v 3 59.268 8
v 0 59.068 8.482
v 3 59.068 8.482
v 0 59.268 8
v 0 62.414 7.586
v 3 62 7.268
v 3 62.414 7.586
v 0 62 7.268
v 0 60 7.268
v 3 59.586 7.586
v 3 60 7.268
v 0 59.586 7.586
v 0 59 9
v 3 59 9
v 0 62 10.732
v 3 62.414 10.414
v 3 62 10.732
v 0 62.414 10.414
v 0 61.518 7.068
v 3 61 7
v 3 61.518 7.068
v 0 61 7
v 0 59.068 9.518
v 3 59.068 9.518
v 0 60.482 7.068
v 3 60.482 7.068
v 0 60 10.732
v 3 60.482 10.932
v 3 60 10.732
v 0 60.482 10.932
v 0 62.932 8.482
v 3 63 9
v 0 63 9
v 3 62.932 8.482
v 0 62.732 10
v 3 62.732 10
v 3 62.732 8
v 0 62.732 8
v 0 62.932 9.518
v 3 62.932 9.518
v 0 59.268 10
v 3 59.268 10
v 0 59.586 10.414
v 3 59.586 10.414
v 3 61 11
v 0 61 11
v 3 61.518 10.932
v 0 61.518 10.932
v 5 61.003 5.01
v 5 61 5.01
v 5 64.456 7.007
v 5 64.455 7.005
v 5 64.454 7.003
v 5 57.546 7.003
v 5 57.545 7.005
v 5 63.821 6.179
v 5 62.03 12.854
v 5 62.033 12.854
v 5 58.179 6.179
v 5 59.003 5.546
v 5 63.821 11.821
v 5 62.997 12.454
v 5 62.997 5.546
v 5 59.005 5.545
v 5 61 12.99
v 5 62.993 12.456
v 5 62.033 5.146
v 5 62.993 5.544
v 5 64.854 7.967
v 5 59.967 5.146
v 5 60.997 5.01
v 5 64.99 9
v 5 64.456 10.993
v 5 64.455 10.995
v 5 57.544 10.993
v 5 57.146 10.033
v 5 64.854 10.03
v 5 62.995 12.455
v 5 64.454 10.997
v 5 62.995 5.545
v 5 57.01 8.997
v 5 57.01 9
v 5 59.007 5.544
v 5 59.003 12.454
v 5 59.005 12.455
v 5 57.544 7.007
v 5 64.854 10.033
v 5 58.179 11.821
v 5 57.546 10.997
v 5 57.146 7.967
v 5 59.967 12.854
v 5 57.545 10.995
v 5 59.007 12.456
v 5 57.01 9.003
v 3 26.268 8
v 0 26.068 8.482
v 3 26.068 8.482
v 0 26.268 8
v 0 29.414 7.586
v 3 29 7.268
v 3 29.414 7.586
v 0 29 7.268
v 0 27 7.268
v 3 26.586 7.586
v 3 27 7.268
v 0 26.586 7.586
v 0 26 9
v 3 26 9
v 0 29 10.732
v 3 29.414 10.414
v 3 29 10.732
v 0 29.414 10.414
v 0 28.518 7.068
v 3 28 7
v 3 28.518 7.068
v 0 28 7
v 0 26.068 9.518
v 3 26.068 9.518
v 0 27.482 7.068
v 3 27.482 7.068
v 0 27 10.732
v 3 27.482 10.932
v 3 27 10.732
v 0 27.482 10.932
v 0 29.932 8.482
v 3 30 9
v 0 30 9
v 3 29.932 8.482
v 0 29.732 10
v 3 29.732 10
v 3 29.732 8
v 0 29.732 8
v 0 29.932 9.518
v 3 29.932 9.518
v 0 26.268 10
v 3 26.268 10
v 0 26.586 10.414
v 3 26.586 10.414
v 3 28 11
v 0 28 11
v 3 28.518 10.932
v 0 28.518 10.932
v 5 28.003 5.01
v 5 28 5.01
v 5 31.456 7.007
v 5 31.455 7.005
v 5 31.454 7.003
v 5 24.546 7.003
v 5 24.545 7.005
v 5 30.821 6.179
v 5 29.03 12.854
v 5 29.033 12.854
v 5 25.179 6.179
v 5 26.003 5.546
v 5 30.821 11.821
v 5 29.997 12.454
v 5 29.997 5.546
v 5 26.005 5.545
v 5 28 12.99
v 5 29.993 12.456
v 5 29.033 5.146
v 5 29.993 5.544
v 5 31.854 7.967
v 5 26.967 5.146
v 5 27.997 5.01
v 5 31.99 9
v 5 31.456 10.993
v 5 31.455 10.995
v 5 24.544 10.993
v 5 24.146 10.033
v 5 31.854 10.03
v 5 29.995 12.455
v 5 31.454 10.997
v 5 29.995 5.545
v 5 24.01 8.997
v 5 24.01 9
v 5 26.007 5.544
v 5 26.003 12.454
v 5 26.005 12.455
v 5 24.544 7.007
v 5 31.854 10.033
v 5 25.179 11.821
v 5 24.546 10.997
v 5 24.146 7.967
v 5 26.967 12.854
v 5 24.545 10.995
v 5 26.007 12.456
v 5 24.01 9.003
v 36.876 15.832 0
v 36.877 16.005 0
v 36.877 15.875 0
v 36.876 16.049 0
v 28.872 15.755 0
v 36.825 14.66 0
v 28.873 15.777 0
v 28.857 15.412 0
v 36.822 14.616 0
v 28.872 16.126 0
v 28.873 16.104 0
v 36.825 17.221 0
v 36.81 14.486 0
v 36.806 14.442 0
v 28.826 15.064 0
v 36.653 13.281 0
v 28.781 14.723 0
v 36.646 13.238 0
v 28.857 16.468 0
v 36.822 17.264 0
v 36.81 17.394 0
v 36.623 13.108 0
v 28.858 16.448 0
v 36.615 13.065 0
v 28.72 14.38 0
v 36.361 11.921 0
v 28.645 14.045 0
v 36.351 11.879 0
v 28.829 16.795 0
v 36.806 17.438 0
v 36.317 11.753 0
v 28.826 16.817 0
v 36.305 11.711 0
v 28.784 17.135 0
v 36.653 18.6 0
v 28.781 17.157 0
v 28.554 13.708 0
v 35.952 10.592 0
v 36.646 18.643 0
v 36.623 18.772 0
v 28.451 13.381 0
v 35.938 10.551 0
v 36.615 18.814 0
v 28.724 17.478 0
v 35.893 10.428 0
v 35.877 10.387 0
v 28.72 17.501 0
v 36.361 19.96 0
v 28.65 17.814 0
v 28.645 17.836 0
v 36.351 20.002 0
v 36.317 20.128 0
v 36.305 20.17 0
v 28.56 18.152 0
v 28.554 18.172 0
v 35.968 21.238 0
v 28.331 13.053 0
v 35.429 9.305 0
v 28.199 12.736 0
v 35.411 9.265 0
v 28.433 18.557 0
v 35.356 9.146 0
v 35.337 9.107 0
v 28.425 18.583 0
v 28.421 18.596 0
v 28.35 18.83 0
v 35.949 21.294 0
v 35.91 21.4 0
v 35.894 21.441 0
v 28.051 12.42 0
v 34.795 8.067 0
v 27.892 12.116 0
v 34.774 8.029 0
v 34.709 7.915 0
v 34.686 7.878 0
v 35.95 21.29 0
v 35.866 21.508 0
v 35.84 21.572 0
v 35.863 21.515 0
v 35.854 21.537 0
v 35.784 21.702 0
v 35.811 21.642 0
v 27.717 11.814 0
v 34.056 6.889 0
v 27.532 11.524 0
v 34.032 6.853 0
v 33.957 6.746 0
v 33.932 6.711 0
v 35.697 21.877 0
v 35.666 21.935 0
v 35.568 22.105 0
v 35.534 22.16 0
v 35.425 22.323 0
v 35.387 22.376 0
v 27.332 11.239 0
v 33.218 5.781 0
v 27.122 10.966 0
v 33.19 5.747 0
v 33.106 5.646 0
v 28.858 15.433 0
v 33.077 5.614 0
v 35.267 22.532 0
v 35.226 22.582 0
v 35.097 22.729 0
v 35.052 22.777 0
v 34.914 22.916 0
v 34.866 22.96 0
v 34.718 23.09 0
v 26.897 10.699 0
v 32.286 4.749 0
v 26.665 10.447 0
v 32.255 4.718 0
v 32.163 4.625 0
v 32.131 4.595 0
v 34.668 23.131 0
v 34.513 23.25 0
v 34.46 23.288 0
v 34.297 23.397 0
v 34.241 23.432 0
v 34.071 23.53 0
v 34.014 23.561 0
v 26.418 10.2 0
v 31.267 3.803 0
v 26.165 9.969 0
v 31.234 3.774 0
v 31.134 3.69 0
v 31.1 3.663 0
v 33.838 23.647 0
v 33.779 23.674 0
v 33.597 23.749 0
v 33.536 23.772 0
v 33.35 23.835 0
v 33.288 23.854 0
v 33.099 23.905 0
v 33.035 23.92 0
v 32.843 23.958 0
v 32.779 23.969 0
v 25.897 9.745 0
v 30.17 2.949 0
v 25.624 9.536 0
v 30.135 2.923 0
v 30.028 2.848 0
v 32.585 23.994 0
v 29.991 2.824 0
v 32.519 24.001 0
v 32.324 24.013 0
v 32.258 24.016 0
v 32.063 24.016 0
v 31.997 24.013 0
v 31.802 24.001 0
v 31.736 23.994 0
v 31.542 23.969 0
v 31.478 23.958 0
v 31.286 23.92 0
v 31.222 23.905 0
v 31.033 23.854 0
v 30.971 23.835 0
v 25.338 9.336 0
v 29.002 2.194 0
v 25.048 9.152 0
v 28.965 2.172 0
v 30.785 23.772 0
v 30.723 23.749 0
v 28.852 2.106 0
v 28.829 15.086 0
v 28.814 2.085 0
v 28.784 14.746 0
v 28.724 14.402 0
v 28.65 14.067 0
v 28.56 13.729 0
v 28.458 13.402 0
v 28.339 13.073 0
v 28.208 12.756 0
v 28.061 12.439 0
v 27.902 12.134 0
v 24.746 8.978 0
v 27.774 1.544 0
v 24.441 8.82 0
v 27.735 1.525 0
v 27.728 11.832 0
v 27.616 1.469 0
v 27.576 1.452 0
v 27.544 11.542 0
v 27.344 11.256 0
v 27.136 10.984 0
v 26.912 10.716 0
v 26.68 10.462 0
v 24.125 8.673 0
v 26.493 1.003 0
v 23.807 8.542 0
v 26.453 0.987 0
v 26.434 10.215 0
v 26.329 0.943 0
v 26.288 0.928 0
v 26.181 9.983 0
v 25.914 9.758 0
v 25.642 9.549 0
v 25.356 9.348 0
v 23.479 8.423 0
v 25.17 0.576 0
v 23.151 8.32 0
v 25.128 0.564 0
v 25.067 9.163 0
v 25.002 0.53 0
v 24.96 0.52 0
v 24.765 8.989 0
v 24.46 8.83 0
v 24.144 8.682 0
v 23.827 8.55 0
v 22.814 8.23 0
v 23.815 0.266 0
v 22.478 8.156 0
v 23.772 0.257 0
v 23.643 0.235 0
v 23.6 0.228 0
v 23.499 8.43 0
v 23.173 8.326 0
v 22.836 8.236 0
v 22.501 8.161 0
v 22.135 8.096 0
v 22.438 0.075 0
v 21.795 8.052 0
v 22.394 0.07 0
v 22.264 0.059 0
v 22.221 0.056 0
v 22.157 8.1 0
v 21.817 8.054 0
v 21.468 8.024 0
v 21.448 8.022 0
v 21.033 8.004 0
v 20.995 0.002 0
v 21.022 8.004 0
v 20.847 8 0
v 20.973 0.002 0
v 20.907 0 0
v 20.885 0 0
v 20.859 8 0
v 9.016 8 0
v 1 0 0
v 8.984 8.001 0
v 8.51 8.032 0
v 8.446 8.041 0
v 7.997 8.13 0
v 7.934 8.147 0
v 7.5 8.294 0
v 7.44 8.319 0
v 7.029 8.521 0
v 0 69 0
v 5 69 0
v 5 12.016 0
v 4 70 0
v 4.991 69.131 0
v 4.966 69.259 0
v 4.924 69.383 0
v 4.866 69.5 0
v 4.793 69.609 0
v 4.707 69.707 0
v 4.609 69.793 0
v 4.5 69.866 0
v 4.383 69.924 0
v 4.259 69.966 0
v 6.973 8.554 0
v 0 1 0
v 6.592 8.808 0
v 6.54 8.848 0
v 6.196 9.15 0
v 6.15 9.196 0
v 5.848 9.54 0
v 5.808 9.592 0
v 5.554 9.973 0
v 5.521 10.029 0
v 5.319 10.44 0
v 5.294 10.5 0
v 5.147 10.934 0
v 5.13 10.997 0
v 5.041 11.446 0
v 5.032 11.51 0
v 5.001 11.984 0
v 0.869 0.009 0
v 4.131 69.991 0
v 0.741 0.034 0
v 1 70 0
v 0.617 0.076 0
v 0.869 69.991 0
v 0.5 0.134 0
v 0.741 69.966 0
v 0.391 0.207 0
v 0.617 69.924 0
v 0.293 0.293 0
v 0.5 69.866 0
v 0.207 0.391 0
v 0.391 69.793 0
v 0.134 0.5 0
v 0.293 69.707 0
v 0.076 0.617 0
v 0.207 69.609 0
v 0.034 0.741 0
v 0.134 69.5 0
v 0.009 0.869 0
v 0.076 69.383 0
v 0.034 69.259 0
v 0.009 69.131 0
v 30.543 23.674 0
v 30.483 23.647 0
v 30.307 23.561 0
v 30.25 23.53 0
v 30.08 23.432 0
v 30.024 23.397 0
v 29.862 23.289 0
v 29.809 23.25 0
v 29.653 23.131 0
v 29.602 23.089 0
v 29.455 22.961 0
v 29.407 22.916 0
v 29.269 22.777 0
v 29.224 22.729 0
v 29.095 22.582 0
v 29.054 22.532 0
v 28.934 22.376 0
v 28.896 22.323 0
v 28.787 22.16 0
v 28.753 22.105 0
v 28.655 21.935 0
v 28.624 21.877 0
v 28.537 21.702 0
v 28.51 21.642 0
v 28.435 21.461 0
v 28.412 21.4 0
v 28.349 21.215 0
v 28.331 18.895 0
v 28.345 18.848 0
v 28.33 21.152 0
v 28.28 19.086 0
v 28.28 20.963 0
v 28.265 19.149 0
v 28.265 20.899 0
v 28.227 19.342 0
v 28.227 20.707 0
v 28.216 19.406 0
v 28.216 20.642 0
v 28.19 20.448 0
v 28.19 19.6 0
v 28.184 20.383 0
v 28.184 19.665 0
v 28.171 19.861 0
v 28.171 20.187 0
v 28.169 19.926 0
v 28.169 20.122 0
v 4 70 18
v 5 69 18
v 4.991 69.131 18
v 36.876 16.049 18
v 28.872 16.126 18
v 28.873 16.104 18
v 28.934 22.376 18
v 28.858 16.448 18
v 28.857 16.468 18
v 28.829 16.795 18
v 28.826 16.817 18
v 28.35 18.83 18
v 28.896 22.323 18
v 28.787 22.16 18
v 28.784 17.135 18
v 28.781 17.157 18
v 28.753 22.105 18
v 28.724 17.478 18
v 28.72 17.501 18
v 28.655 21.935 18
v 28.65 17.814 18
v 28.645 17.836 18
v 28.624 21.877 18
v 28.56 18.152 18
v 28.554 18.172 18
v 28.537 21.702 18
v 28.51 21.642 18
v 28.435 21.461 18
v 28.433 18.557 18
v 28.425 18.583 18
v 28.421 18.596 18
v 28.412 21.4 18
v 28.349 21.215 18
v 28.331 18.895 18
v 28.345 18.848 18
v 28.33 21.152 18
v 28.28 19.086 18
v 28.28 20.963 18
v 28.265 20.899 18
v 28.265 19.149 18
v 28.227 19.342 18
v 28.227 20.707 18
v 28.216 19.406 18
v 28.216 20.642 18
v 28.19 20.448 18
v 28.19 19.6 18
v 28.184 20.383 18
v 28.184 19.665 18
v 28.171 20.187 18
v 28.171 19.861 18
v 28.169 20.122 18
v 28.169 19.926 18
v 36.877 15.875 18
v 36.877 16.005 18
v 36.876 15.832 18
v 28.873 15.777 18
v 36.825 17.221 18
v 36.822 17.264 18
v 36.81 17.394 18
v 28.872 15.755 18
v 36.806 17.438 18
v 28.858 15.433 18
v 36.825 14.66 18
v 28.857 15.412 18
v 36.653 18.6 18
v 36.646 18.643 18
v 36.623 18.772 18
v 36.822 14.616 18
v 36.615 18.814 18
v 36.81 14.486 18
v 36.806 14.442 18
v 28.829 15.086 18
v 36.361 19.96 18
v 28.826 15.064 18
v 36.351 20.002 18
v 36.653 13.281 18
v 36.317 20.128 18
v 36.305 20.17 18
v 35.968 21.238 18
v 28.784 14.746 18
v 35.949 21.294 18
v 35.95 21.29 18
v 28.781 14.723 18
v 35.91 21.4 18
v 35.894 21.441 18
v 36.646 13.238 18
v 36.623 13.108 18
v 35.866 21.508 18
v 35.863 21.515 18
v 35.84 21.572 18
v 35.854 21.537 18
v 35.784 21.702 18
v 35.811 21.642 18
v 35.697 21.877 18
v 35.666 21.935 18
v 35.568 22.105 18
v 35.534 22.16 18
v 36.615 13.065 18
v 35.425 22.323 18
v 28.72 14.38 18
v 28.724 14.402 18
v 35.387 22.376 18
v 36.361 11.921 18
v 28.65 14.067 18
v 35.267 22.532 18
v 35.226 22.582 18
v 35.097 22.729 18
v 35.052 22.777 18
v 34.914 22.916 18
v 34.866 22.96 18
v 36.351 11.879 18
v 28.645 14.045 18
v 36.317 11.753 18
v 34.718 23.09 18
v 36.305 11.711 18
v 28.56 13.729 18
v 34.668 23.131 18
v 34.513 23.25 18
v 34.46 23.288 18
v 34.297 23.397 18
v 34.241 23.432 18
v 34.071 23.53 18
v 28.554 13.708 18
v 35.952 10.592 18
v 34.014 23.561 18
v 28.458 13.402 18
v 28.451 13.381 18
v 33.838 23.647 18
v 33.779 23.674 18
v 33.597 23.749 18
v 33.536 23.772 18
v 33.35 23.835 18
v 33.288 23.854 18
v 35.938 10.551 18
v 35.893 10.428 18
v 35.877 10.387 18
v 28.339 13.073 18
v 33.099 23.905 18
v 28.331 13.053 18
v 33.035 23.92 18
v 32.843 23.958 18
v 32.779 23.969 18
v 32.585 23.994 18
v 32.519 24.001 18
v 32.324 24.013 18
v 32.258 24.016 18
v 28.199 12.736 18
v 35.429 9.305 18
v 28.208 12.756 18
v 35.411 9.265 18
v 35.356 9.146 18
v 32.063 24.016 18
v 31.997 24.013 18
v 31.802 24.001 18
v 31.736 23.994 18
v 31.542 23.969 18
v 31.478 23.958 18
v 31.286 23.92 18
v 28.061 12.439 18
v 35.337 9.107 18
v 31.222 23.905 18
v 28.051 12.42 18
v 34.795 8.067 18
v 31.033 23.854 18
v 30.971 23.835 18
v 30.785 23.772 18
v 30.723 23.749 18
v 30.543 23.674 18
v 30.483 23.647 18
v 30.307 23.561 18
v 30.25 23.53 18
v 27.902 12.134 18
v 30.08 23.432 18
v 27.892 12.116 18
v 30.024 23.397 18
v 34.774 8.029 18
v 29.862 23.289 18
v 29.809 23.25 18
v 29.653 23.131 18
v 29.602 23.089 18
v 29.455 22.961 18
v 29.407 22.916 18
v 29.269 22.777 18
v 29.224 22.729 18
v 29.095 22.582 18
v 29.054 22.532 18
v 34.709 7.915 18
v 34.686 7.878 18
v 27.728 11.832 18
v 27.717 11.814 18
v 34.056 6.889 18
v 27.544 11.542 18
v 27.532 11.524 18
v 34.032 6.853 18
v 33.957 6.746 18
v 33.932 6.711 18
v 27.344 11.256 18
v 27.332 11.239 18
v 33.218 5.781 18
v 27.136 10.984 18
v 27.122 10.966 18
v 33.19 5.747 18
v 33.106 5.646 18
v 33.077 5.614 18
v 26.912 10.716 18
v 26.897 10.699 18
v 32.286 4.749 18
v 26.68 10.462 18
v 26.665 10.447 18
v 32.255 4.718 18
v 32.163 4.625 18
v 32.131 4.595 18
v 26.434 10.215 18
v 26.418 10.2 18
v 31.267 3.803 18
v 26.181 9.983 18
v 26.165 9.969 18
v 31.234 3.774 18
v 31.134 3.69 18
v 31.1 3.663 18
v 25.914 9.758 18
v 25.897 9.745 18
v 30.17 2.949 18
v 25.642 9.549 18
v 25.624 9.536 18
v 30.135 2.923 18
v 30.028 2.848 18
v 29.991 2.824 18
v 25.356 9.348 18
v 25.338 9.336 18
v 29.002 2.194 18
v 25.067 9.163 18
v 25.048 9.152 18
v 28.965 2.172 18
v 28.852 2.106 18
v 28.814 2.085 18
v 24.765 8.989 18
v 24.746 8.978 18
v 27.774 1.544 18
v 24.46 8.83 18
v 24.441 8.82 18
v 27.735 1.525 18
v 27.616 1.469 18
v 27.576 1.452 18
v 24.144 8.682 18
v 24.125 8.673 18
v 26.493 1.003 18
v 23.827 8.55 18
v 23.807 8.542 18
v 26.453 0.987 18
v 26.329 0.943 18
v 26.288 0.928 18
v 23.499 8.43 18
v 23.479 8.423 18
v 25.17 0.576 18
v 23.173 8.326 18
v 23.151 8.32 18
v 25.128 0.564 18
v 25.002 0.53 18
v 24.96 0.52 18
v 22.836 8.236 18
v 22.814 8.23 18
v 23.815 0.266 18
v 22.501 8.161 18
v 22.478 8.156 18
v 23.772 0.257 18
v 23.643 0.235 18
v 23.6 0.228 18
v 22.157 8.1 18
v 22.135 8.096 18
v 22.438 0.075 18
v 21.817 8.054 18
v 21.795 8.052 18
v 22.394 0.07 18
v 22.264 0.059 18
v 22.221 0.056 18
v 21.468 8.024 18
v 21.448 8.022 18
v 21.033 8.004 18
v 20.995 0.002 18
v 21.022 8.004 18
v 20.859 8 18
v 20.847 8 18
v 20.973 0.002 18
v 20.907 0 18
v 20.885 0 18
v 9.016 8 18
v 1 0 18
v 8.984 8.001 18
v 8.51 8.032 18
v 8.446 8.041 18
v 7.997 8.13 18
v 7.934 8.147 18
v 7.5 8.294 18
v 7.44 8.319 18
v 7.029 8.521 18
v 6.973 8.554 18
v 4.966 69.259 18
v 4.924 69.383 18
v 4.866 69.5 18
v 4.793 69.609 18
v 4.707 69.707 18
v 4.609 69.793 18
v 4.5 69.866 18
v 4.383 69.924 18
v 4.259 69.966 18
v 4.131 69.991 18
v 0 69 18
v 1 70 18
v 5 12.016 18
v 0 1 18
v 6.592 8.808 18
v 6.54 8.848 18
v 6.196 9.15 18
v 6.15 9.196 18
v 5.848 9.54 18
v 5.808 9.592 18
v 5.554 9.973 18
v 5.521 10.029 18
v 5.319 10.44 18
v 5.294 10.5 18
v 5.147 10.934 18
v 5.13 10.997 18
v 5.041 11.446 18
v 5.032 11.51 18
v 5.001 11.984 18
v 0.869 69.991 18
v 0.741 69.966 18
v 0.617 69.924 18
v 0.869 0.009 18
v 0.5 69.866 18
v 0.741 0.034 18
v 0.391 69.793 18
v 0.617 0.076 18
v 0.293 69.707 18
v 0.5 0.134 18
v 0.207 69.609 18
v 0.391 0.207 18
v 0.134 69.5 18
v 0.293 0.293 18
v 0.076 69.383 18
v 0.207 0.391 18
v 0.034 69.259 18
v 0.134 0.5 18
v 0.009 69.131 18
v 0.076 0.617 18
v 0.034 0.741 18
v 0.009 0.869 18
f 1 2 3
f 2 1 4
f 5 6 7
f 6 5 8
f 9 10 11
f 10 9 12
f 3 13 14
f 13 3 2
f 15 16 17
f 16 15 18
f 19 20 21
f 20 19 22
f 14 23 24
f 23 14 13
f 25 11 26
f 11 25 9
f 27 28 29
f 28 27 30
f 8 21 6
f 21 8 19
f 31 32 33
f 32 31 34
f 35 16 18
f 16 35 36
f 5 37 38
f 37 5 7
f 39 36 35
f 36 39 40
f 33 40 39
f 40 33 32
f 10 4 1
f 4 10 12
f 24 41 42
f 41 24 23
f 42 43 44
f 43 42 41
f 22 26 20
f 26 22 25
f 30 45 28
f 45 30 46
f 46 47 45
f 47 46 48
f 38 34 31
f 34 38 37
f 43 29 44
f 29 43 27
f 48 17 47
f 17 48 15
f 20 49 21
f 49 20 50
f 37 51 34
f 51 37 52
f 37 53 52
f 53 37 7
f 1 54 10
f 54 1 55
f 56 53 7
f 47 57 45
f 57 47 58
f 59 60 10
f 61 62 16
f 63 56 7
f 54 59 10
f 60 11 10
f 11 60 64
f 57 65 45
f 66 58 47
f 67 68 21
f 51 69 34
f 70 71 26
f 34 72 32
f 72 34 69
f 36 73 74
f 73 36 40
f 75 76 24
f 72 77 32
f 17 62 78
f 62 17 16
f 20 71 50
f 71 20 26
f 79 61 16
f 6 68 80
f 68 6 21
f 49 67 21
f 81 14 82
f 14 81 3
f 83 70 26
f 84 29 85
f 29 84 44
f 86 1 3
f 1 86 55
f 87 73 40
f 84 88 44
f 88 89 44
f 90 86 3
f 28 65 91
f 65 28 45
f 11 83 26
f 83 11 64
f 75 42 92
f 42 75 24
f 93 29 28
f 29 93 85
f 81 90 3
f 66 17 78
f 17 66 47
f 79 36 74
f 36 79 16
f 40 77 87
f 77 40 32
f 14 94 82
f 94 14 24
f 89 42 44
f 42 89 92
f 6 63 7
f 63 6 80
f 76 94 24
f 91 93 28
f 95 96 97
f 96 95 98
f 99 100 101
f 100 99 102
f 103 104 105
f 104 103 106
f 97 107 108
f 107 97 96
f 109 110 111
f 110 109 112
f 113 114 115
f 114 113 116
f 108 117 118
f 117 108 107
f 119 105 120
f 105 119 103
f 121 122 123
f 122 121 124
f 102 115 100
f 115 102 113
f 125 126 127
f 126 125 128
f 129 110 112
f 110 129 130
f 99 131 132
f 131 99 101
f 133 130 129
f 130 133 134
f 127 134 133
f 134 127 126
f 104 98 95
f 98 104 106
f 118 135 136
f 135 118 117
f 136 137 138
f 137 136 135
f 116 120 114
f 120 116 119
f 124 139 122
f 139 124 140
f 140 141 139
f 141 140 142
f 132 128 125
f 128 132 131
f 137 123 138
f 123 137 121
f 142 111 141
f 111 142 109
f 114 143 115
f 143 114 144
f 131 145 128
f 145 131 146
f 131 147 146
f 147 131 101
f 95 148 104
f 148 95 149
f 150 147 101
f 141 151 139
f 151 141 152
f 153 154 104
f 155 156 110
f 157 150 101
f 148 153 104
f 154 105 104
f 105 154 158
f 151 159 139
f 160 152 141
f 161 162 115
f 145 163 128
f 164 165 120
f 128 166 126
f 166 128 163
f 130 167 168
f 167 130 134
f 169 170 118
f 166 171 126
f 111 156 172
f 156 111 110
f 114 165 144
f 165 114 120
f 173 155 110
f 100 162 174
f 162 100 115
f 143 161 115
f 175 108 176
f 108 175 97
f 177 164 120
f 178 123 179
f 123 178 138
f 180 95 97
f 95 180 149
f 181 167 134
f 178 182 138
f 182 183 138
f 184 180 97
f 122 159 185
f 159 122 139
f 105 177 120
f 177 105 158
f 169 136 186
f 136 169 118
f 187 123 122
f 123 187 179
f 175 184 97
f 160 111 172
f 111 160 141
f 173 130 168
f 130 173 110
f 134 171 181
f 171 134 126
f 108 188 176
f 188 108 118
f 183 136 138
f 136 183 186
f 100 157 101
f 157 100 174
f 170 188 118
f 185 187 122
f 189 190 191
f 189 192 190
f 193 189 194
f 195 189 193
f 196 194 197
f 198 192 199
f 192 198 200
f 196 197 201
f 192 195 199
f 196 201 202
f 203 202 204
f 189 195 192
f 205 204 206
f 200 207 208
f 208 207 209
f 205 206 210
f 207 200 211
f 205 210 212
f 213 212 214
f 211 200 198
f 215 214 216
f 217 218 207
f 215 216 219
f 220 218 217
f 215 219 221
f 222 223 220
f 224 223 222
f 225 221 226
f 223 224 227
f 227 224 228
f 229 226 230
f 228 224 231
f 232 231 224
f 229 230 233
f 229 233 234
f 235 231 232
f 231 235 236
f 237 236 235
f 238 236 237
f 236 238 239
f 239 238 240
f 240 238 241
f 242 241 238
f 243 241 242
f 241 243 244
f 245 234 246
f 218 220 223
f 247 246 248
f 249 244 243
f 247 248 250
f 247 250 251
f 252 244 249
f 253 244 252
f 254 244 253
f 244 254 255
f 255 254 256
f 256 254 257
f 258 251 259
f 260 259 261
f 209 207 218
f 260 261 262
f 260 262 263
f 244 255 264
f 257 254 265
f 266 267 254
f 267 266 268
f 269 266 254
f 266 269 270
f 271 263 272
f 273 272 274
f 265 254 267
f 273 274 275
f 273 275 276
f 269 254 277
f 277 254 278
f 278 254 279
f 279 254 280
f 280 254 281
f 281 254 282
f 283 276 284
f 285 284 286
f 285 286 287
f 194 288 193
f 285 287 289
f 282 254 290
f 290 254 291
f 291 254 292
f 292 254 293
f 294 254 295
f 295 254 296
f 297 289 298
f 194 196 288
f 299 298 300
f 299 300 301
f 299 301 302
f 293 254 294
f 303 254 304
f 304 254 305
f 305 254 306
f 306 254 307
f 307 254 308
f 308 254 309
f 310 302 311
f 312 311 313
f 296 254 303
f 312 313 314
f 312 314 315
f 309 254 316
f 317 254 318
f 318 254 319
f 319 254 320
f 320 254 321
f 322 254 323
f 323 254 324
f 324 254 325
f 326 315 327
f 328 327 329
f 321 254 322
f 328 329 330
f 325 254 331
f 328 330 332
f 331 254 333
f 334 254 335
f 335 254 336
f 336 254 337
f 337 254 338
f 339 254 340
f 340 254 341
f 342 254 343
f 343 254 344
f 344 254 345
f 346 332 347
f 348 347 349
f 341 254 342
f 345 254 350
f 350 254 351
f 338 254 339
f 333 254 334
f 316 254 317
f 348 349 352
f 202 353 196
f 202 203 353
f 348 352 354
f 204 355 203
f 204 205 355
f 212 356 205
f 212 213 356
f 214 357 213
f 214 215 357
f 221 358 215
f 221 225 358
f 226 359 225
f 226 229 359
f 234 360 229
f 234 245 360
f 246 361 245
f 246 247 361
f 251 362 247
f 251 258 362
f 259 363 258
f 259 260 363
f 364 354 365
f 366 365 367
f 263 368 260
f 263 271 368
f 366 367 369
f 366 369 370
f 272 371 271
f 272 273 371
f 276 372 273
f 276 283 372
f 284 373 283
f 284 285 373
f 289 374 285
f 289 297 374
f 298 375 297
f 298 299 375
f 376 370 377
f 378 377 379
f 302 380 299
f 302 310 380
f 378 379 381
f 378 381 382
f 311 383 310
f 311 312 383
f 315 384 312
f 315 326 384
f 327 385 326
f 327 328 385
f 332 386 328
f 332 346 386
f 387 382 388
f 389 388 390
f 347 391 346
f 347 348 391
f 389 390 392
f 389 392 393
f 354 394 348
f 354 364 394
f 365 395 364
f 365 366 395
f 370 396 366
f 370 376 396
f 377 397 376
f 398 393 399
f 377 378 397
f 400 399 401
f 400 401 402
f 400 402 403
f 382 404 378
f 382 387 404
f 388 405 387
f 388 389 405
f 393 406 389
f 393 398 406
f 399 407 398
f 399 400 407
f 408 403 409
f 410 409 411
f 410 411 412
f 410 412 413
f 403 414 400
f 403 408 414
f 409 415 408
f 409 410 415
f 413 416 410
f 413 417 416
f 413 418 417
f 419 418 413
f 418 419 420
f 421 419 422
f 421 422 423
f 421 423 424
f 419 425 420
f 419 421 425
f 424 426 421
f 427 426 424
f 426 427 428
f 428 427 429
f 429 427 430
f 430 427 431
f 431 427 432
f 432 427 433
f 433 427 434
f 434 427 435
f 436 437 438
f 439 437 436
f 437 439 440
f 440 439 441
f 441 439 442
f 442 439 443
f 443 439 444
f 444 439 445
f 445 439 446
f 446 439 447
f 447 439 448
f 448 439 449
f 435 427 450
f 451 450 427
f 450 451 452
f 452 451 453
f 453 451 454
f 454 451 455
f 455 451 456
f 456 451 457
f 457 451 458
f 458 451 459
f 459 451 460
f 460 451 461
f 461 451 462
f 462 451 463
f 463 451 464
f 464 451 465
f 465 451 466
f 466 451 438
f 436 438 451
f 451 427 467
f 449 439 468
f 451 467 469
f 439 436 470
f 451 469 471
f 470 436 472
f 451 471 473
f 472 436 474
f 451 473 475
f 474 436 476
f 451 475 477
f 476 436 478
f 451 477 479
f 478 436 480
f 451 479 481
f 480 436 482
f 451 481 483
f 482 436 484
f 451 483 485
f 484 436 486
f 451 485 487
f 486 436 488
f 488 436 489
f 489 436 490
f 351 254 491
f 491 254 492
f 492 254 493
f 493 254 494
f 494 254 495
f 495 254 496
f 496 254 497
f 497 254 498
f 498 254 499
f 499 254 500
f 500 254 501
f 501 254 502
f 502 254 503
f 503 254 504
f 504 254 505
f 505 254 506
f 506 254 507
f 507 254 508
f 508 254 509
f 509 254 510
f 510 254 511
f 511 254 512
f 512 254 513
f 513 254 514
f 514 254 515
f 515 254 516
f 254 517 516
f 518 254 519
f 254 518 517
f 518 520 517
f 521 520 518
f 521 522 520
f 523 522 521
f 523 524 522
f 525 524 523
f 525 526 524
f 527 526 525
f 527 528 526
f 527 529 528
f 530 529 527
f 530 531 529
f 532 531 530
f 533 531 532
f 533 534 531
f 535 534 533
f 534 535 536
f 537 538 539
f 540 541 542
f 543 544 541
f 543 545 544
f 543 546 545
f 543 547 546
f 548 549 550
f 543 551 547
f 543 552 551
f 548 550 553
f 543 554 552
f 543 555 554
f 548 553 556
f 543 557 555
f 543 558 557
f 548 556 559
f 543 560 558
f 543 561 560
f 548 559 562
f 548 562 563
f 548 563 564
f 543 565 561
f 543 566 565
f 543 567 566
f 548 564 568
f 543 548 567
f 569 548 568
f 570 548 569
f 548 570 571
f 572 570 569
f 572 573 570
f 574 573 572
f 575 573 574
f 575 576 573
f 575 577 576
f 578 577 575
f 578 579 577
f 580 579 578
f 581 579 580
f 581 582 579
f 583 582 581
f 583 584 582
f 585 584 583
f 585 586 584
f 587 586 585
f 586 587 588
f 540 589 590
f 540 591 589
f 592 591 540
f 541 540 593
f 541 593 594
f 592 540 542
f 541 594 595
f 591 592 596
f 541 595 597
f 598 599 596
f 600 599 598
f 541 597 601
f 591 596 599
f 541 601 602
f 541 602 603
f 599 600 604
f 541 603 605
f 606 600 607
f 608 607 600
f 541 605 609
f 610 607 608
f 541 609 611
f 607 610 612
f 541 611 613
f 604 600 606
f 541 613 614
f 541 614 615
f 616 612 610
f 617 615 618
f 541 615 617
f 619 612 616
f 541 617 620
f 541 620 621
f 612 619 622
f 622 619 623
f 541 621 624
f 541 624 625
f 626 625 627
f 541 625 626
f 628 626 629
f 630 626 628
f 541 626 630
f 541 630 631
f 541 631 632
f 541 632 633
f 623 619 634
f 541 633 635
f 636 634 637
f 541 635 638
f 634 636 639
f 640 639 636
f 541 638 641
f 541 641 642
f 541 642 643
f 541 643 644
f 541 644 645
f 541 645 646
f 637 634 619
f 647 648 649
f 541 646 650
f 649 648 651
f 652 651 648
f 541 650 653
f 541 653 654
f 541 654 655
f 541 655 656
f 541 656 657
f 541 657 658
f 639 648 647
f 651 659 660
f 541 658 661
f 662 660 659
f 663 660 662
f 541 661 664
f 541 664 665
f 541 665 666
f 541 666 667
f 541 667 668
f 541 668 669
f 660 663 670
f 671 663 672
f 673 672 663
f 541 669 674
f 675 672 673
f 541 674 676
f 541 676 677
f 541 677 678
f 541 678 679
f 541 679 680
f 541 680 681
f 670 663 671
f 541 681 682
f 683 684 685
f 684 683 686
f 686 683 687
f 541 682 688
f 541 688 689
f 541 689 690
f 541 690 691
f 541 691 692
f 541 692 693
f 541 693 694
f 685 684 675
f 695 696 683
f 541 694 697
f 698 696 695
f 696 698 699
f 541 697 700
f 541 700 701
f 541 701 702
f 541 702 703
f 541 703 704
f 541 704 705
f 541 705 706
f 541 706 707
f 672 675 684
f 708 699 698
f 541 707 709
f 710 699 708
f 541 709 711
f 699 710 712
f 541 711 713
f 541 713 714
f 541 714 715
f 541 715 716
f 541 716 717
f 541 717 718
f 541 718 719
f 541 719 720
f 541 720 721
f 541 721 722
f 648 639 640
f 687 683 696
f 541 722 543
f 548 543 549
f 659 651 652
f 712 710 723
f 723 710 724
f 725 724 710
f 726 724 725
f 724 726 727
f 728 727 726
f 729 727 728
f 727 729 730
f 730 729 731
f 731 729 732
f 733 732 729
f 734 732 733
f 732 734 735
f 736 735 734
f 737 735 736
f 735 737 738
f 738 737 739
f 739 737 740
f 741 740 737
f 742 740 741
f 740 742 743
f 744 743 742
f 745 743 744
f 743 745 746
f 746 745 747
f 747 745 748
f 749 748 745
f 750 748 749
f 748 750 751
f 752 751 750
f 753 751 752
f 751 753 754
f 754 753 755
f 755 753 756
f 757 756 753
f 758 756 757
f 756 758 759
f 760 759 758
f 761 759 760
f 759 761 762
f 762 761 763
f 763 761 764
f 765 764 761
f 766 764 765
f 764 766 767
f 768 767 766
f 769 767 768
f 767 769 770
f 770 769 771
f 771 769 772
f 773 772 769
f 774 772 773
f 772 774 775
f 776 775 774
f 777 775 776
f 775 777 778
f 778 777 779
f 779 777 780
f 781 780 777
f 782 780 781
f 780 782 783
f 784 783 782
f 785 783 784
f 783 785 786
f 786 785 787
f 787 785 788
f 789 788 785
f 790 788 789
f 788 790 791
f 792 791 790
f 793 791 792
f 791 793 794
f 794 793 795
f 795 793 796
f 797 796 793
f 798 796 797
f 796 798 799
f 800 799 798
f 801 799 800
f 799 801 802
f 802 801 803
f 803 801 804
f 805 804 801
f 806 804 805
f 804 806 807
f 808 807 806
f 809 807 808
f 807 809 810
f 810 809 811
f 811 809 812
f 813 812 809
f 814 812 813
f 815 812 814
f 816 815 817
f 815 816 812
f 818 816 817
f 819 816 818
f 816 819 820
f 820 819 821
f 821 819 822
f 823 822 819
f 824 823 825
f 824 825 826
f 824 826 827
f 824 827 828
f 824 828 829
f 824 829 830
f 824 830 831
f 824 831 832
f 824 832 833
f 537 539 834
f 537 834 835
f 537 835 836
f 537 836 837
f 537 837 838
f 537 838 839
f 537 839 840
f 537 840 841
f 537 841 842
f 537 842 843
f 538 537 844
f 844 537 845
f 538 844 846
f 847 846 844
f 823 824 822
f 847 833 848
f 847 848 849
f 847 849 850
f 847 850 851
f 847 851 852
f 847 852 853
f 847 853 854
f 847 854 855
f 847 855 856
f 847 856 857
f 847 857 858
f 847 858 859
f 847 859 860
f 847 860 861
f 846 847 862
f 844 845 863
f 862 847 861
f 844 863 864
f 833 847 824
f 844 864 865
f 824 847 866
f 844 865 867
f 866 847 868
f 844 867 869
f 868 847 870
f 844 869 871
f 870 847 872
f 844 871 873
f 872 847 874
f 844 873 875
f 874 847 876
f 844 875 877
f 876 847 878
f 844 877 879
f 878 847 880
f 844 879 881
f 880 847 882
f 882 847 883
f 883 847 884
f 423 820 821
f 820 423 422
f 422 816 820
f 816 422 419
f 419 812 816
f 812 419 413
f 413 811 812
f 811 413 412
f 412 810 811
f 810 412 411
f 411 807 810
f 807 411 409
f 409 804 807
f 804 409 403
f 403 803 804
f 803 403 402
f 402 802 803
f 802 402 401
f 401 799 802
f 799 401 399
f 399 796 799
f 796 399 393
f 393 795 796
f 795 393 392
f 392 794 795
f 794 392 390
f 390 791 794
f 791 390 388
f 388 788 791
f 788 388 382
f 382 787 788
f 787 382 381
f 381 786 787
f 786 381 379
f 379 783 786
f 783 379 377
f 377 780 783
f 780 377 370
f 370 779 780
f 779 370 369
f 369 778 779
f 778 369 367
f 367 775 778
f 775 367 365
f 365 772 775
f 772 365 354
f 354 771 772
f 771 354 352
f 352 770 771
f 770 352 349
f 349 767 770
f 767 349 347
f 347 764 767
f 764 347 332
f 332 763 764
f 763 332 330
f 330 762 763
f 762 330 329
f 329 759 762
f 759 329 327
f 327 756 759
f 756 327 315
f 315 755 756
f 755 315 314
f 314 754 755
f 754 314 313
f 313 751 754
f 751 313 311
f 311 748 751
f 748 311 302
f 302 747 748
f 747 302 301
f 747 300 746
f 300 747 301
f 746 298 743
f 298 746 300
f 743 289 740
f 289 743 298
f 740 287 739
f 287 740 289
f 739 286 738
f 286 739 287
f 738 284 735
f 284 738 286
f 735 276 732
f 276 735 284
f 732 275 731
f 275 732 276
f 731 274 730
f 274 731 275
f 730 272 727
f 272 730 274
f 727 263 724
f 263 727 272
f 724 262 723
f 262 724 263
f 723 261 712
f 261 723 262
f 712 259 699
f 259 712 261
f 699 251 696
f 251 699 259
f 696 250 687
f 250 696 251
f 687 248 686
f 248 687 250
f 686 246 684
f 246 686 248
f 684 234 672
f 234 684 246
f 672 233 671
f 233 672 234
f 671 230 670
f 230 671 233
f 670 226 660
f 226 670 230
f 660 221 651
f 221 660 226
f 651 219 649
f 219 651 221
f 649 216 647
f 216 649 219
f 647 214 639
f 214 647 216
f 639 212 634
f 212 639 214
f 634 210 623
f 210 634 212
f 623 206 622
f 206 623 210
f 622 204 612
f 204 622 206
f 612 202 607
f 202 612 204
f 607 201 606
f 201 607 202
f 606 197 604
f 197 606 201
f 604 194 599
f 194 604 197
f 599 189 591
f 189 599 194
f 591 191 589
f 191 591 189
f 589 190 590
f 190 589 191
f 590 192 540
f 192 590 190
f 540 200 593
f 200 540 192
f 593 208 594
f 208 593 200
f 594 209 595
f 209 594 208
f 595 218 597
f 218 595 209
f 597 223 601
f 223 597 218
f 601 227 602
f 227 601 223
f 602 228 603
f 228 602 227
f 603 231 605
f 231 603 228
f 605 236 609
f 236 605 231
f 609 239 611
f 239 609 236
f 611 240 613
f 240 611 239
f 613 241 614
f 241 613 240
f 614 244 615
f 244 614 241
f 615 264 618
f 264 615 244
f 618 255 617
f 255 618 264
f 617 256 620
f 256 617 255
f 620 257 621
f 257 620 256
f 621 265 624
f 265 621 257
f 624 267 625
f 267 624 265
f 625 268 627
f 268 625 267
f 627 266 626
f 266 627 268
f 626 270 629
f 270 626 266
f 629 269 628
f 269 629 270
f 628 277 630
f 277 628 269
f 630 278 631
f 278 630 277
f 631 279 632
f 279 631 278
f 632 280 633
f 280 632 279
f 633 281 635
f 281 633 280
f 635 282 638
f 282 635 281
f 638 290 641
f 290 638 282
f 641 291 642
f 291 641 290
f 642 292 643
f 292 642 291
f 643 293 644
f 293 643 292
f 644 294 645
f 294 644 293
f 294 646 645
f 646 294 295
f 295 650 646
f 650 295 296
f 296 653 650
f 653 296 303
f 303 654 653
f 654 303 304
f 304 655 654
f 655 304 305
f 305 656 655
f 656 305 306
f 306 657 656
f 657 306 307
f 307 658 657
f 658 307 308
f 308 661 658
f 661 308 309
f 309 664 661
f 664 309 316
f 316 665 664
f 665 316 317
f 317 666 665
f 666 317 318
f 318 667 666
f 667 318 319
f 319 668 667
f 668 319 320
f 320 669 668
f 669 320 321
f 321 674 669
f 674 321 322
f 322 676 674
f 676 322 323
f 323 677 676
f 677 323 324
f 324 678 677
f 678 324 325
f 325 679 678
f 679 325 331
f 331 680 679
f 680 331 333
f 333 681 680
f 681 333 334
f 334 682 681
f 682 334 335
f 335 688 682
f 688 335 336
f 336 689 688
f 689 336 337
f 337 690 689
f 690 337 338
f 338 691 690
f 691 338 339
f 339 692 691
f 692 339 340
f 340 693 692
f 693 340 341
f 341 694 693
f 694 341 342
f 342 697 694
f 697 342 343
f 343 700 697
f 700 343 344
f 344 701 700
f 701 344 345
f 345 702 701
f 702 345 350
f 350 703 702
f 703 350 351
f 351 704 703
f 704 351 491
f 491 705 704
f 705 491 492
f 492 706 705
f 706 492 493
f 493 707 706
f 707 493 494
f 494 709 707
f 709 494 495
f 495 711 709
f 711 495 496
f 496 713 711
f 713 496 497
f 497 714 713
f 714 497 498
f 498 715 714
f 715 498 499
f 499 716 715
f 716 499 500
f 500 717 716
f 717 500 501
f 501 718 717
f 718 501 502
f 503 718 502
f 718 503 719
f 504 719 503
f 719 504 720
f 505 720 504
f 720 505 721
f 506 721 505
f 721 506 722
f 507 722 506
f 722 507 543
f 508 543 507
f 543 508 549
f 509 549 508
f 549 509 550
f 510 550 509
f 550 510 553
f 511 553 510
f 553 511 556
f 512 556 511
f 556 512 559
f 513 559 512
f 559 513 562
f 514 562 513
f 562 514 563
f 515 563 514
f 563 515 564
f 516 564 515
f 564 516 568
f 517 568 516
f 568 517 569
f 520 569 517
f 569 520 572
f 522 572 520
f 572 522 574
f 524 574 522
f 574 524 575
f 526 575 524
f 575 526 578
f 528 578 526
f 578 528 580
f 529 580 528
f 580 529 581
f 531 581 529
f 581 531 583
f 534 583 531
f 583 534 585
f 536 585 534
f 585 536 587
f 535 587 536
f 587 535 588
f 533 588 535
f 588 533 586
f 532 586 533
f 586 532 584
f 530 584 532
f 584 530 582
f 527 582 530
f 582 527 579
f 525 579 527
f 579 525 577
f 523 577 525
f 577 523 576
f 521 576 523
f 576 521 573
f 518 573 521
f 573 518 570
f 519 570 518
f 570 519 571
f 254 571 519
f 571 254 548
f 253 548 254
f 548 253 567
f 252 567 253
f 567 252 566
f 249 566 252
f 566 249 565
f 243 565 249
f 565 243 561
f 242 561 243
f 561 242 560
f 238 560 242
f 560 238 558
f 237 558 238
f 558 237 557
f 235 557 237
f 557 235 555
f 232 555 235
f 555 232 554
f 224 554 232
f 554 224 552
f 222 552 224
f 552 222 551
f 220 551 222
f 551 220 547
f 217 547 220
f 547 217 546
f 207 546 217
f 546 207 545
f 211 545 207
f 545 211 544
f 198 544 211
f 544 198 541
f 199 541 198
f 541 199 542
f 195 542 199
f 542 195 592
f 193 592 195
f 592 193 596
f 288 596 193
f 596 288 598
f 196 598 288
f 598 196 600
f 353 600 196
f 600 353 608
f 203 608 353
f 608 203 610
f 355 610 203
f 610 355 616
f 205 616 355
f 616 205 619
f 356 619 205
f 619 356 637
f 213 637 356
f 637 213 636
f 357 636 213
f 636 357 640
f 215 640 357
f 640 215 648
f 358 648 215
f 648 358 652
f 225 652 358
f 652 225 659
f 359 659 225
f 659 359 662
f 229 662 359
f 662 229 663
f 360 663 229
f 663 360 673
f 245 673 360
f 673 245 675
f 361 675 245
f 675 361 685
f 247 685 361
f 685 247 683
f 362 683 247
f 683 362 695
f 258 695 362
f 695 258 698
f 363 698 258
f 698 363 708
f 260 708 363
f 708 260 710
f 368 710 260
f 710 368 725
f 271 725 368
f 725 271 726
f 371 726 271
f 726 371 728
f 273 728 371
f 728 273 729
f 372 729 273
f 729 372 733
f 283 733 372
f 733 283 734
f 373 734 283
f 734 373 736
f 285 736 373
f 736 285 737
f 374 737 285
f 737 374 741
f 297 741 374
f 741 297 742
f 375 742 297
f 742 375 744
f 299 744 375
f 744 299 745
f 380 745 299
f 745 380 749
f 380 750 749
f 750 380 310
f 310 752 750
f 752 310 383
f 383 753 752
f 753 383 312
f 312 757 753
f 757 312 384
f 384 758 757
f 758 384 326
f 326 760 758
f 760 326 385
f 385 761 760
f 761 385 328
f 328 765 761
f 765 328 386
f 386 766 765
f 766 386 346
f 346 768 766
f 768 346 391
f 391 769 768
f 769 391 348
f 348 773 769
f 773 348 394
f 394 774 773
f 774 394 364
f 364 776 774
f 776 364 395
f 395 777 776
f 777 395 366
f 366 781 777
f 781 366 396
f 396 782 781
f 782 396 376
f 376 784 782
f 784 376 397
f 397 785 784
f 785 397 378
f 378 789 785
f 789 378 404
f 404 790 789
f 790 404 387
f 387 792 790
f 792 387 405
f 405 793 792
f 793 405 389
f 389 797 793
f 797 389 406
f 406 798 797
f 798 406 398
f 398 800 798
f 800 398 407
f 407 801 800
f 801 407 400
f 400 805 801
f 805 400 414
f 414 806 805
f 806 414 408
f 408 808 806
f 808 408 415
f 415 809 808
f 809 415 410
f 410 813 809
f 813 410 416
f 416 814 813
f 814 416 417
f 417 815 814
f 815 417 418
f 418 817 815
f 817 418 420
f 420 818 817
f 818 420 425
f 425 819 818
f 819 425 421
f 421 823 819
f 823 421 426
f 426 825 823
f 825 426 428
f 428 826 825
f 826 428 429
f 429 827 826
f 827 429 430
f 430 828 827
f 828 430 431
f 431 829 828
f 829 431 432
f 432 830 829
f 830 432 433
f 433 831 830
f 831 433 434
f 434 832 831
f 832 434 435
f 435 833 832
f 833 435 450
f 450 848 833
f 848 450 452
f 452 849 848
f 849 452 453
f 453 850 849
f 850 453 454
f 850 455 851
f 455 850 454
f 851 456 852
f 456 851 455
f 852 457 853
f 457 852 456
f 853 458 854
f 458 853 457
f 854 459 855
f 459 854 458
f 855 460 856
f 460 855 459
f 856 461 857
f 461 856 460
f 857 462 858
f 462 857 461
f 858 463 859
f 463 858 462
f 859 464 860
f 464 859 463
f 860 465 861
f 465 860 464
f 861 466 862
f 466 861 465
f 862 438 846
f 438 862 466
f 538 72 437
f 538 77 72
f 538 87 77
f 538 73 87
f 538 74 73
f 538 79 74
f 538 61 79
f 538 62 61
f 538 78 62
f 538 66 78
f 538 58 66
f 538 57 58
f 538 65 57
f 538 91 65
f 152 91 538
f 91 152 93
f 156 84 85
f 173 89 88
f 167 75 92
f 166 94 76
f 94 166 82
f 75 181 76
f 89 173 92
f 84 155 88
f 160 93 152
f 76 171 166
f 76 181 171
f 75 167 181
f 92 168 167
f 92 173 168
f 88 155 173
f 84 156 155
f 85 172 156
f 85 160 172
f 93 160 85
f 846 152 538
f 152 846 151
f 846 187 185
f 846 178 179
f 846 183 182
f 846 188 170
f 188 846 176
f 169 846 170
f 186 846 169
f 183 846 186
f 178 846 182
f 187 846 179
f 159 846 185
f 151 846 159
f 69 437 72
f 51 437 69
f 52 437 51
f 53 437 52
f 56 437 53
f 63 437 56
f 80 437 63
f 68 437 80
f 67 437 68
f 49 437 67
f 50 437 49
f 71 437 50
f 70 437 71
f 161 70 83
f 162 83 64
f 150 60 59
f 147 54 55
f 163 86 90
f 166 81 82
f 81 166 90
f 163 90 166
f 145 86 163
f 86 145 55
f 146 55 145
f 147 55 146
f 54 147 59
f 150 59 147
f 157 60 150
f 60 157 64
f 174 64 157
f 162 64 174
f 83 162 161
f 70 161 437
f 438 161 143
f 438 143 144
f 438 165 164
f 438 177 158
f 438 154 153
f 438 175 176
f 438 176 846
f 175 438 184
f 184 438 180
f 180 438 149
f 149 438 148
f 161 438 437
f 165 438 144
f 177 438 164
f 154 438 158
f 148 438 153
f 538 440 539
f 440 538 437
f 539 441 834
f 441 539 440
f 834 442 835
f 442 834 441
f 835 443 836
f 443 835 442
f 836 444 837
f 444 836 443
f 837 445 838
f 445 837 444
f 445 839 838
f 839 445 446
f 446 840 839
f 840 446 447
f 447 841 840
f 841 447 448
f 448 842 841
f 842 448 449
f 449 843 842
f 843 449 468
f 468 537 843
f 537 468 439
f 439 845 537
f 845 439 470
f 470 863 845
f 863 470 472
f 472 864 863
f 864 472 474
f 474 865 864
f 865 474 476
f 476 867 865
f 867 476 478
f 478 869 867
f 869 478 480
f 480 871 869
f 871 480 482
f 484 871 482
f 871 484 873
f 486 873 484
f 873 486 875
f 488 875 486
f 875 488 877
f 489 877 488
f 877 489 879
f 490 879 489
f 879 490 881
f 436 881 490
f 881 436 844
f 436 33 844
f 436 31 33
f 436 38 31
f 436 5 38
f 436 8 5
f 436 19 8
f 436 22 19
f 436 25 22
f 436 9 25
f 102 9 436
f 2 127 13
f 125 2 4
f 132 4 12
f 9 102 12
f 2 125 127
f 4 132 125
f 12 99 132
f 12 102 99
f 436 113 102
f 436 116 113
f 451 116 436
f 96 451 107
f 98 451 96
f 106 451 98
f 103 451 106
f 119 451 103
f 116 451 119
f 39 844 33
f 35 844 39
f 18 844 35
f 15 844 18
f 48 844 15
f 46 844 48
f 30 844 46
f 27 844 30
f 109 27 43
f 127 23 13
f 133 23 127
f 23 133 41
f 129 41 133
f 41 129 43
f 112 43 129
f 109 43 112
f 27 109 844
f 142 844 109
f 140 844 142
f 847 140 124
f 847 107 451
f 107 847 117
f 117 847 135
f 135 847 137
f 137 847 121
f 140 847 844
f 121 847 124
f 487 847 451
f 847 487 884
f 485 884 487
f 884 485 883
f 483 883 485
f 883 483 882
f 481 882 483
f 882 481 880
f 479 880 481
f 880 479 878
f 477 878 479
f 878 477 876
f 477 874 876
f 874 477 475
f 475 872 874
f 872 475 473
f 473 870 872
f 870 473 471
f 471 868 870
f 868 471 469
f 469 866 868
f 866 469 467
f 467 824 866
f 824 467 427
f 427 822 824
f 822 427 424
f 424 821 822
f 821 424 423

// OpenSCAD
// Настенный крюк: пластина под два самореза и J-образный крюк.
// Лежит так, как печатается, — на боку: слои идут вдоль крюка,
// и он не отломится по слою под нагрузкой.
$fn = 48;

/* [Крюк] */
// Вылет от стены, мм
reach = 35;             // [15:1:80]
// Высота загиба, мм
lip = 16;               // [6:1:40]
// Толщина крюка, мм
arm = 8;                // [5:0.5:15]
// Ширина, мм
width = 18;             // [10:1:40]
/* [Пластина] */
// Высота пластины, мм
plate_height = 70;      // [40:5:140]
// Толщина пластины, мм
plate = 5;              // [3:0.5:10]
/* [Саморезы] */
// Диаметр самореза, мм
screw = 4;              // [2.5:0.5:6]
// Диаметр шляпки, мм
head = 8;               // [5:0.5:12]

w = max(width, head + 4);
arm_y = arm / 2;
// Загиб — дуга: центр над концом прямого участка, конец смотрит вверх и чуть внутрь.
bend = max(arm, lip / 1.34);
bend_c = [max(reach, plate + arm + 2 * bend) - bend - arm / 2, arm_y + bend];
// Отверстия: верхнее у края пластины, нижнее над крюком.
holes = [plate_height - head / 2 - 5, max(arm + head / 2 + 6, plate_height * 0.4)];

// Дуга шириной arm от угла a0 до a1 вокруг центра c радиусом r.
module arc(c, r, a0, a1) {
    polygon(concat(
        [for (a = [a0 : 5 : a1]) c + (r + arm / 2) * [cos(a), sin(a)]],
        [for (a = [a1 : -5 : a0]) c + (r - arm / 2) * [cos(a), sin(a)]]
    ));
    translate(c + r * [cos(a1), sin(a1)]) circle(d = arm);
}

// Профиль сбоку: x — от стены, y — вверх.
module profile() {
    // Внешние углы скруглены на 1 мм, внутренние — на 4 мм.
    offset(r = 1) offset(r = -1)
        offset(r = -4) offset(r = 4)
            union() {
                square([plate, plate_height]);
                hull() {
                    translate([plate, arm_y]) circle(d = arm);
                    translate([bend_c[0], arm_y]) circle(d = arm);
                }
                arc(bend_c, bend, -90, 20);
            }
}

difference() {
    linear_extrude(height = w) profile();
    for (y = holes) {
        // Сквозное отверстие и потай под шляпку с лицевой стороны.
        translate([-1, y, w / 2]) rotate([0, 90, 0])
            cylinder(h = plate + 2, d = screw, $fn = 24);
        translate([plate - (head - screw) / 2, y, w / 2]) rotate([0, 90, 0])
            cylinder(h = (head - screw) / 2 + 0.01, d1 = screw, d2 = head, $fn = 24);
    }
}
